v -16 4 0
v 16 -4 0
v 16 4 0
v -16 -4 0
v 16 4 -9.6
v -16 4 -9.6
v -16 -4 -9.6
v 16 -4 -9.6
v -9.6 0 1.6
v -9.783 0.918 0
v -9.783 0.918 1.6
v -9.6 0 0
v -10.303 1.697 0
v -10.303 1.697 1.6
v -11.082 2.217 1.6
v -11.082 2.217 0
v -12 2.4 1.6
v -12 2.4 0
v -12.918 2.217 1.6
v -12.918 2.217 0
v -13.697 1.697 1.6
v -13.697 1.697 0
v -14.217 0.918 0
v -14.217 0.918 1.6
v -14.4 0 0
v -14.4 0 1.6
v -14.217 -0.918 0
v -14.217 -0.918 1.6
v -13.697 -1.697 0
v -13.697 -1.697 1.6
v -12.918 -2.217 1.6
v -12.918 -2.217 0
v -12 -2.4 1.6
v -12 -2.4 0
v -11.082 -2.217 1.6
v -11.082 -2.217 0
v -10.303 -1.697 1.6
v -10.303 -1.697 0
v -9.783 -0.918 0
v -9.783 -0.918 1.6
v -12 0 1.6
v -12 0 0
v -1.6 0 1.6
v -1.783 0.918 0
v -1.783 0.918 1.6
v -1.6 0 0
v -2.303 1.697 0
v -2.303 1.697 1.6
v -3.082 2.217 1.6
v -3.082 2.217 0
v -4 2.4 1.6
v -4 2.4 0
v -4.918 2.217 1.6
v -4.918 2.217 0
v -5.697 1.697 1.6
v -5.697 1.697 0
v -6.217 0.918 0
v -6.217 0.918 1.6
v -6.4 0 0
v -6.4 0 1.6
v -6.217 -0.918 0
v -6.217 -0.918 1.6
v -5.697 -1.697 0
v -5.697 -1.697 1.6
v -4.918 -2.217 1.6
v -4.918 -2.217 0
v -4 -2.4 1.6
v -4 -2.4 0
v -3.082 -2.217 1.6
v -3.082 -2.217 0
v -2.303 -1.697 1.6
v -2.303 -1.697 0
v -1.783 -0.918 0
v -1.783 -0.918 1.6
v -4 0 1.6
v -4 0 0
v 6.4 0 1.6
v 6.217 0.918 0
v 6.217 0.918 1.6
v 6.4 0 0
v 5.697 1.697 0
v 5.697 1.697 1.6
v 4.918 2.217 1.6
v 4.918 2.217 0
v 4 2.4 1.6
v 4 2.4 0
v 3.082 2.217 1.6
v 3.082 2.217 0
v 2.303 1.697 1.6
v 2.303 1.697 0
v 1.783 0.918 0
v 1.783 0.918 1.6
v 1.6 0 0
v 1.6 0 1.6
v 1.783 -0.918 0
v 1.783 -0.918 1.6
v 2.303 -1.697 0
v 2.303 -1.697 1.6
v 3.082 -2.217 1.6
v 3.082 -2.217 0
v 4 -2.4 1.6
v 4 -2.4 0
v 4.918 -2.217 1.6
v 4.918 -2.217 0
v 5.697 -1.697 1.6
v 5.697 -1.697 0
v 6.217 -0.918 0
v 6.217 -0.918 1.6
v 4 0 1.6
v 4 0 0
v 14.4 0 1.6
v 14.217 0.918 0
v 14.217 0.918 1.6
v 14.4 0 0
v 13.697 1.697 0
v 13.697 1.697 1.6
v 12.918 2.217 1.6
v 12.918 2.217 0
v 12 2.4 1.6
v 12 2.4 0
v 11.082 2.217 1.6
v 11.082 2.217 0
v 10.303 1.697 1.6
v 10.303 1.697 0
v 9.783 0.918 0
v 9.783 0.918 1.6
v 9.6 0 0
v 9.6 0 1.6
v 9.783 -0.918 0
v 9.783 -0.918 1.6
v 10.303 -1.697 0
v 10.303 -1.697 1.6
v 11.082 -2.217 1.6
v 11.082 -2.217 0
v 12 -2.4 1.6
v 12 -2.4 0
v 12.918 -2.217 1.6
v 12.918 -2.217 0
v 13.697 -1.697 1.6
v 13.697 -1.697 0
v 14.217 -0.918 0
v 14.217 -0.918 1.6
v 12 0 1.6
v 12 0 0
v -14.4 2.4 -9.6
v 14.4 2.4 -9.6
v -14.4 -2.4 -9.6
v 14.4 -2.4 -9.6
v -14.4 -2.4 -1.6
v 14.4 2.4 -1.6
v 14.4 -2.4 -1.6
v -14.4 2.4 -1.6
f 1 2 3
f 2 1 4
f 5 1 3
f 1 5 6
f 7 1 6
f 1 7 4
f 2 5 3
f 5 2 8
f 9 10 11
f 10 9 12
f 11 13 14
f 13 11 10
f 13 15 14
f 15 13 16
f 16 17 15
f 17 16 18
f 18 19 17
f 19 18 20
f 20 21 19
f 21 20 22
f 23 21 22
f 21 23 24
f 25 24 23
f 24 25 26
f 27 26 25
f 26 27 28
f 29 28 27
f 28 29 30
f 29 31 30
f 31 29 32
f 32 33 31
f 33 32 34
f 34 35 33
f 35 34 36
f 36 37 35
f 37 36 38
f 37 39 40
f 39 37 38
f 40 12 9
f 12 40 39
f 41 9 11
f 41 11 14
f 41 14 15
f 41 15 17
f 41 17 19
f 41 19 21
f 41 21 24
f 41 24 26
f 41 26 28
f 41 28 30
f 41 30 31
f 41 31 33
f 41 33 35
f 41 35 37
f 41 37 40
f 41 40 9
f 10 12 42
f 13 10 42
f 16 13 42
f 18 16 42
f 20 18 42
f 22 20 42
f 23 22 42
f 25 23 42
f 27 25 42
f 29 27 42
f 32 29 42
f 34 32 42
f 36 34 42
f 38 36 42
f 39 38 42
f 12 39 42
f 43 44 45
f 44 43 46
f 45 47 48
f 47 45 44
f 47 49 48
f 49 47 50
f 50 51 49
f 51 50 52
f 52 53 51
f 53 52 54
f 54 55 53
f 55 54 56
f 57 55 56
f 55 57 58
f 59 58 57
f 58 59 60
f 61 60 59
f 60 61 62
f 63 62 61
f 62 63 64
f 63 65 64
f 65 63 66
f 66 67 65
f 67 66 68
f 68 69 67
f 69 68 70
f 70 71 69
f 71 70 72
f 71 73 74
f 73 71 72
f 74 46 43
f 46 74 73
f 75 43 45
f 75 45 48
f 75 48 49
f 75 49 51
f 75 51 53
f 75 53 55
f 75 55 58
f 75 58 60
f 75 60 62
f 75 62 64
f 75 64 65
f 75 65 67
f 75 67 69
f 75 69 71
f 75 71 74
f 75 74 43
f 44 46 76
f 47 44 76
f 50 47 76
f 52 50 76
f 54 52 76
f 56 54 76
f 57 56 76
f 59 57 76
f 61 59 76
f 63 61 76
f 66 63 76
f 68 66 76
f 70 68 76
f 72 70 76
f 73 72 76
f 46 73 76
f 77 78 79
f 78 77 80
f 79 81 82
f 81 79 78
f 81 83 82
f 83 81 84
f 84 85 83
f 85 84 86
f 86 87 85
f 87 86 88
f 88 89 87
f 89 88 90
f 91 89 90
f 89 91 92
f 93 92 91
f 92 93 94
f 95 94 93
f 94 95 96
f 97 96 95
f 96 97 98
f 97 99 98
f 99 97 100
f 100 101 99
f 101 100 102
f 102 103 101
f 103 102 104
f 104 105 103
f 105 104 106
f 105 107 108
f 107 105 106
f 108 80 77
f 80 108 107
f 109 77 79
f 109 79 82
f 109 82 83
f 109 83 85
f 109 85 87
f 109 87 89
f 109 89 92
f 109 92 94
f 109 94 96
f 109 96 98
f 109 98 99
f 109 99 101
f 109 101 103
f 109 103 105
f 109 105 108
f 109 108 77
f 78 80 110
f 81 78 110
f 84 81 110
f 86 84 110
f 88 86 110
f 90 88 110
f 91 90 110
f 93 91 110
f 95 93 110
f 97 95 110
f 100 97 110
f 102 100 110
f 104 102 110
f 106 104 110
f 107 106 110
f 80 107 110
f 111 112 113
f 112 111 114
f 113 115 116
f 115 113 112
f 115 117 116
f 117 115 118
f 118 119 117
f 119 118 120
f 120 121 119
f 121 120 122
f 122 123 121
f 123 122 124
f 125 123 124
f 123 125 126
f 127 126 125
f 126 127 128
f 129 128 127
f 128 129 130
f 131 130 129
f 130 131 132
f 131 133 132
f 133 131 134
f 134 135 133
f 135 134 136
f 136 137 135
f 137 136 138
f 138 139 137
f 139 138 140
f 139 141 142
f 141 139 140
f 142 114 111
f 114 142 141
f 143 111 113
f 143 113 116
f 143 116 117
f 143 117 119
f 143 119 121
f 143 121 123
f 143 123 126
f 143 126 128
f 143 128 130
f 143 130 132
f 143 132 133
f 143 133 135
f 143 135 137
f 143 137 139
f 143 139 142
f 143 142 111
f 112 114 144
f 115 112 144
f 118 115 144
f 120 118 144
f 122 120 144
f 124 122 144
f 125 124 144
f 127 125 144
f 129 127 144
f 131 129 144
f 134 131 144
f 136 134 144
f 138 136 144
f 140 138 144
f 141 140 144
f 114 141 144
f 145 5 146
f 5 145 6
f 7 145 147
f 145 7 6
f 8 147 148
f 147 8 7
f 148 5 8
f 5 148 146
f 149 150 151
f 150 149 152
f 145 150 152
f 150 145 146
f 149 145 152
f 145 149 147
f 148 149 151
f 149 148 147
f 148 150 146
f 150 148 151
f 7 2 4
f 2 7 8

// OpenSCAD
// file: ../p/4-4edge.scad
use <../lib.scad>
function ldraw_lib__4_4edge() = [
// 0 Circle 1.0
// 0 Name: 4-4edge.dat
// 0 Author: James Jessiman
// 0 !LDRAW_ORG Primitive UPDATE 2017-01
// 0 !LICENSE Licensed under CC BY 2.0 and CC BY 4.0 : see CAreadme.txt
// 
// 0 BFC CERTIFY CCW
  [0,"BFC","CERTIFY"],
  [0,"BFC","CCW"],
// 
// 0 !HISTORY 1998-12-15 [PTadmin] Official Update 1998-10
// 0 !HISTORY 2005-12-28 [PTadmin] Official Update 2005-01
// 0 !HISTORY 2007-06-24 [PTadmin] Header formatted for Contributor Agreement
// 0 !HISTORY 2008-07-01 [PTadmin] Official Update 2008-01
// 0 !HISTORY 2017-01-15 [Steffen] BFCed
// 0 !HISTORY 2017-12-30 [PTadmin] Official Update 2017-01
// 
// 
// 2 24 1 0 0 0.9239 0 0.3827
  [2,24,1,0,0,0.9239,0,0.3827],
// 2 24 0.9239 0 0.3827 0.7071 0 0.7071
  [2,24,0.9239,0,0.3827,0.7071,0,0.7071],
// 2 24 0.7071 0 0.7071 0.3827 0 0.9239
  [2,24,0.7071,0,0.7071,0.3827,0,0.9239],
// 2 24 0.3827 0 0.9239 0 0 1
  [2,24,0.3827,0,0.9239,0,0,1],
// 2 24 0 0 1 -0.3827 0 0.9239
  [2,24,0,0,1,-0.3827,0,0.9239],
// 2 24 -0.3827 0 0.9239 -0.7071 0 0.7071
  [2,24,-0.3827,0,0.9239,-0.7071,0,0.7071],
// 2 24 -0.7071 0 0.7071 -0.9239 0 0.3827
  [2,24,-0.7071,0,0.7071,-0.9239,0,0.3827],
// 2 24 -0.9239 0 0.3827 -1 0 -0
  [2,24,-0.9239,0,0.3827,-1,0,-0],
// 2 24 -1 0 -0 -0.9239 0 -0.3827
  [2,24,-1,0,-0,-0.9239,0,-0.3827],
// 2 24 -0.9239 0 -0.3827 -0.7071 0 -0.7071
  [2,24,-0.9239,0,-0.3827,-0.7071,0,-0.7071],
// 2 24 -0.7071 0 -0.7071 -0.3827 0 -0.9239
  [2,24,-0.7071,0,-0.7071,-0.3827,0,-0.9239],
// 2 24 -0.3827 0 -0.9239 0 0 -1
  [2,24,-0.3827,0,-0.9239,0,0,-1],
// 2 24 0 0 -1 0.3827 0 -0.9239
  [2,24,0,0,-1,0.3827,0,-0.9239],
// 2 24 0.3827 0 -0.9239 0.7071 0 -0.7071
  [2,24,0.3827,0,-0.9239,0.7071,0,-0.7071],
// 2 24 0.7071 0 -0.7071 0.9239 0 -0.3827
  [2,24,0.7071,0,-0.7071,0.9239,0,-0.3827],
// 2 24 0.9239 0 -0.3827 1 0 0
  [2,24,0.9239,0,-0.3827,1,0,0],
];
module ldraw_lib__4_4edge(step=0, col=false, unit=2/5, alt=false, line=0.2, solid=!$preview)
    makepoly(ldraw_lib__4_4edge(), step=step, col=col, unit=unit, alt=alt, line=line, solid=solid);
ldraw_lib__4_4edge(line=0.2);
// file: ../p/4-4disc.scad
use <../lib.scad>
function ldraw_lib__4_4disc() = [
// 0 Disc 1.0
// 0 Name: 4-4disc.dat
// 0 Author: James Jessiman
// 0 !LDRAW_ORG Primitive UPDATE 2002-02
// 0 !LICENSE Licensed under CC BY 2.0 and CC BY 4.0 : see CAreadme.txt
// 
// 0 BFC CERTIFY CCW
  [0,"BFC","CERTIFY"],
  [0,"BFC","CCW"],
// 
// 0 !HISTORY 1998-12-15 [PTadmin] Official Update 1998-10
// 0 !HISTORY 2002-03-23 [sbliss] Added BFC statement
// 0 !HISTORY 2002-04-25 [PTadmin] Official Update 2002-02
// 0 !HISTORY 2007-06-24 [PTadmin] Header formatted for Contributor Agreement
// 0 !HISTORY 2008-07-01 [PTadmin] Official Update 2008-01
// 
// 
// 3 16 0 0 0 1 0 0 0.9239 0 0.3827
  [3,16,0,0,0,1,0,0,0.9239,0,0.3827],
// 3 16 0 0 0 0.9239 0 0.3827 0.7071 0 0.7071
  [3,16,0,0,0,0.9239,0,0.3827,0.7071,0,0.7071],
// 3 16 0 0 0 0.7071 0 0.7071 0.3827 0 0.9239
  [3,16,0,0,0,0.7071,0,0.7071,0.3827,0,0.9239],
// 3 16 0 0 0 0.3827 0 0.9239 0 0 1
  [3,16,0,0,0,0.3827,0,0.9239,0,0,1],
// 3 16 0 0 0 0 0 1 -0.3827 0 0.9239
  [3,16,0,0,0,0,0,1,-0.3827,0,0.9239],
// 3 16 0 0 0 -0.3827 0 0.9239 -0.7071 0 0.7071
  [3,16,0,0,0,-0.3827,0,0.9239,-0.7071,0,0.7071],
// 3 16 0 0 0 -0.7071 0 0.7071 -0.9239 0 0.3827
  [3,16,0,0,0,-0.7071,0,0.7071,-0.9239,0,0.3827],
// 3 16 0 0 0 -0.9239 0 0.3827 -1 0 -0
  [3,16,0,0,0,-0.9239,0,0.3827,-1,0,-0],
// 3 16 0 0 0 -1 0 -0 -0.9239 0 -0.3827
  [3,16,0,0,0,-1,0,-0,-0.9239,0,-0.3827],
// 3 16 0 0 0 -0.9239 0 -0.3827 -0.7071 0 -0.7071
  [3,16,0,0,0,-0.9239,0,-0.3827,-0.7071,0,-0.7071],
// 3 16 0 0 0 -0.7071 0 -0.7071 -0.3827 0 -0.9239
  [3,16,0,0,0,-0.7071,0,-0.7071,-0.3827,0,-0.9239],
// 3 16 0 0 0 -0.3827 0 -0.9239 0 0 -1
  [3,16,0,0,0,-0.3827,0,-0.9239,0,0,-1],
// 3 16 0 0 0 0 0 -1 0.3827 0 -0.9239
  [3,16,0,0,0,0,0,-1,0.3827,0,-0.9239],
// 3 16 0 0 0 0.3827 0 -0.9239 0.7071 0 -0.7071
  [3,16,0,0,0,0.3827,0,-0.9239,0.7071,0,-0.7071],
// 3 16 0 0 0 0.7071 0 -0.7071 0.9239 0 -0.3827
  [3,16,0,0,0,0.7071,0,-0.7071,0.9239,0,-0.3827],
// 3 16 0 0 0 0.9239 0 -0.3827 1 0 0
  [3,16,0,0,0,0.9239,0,-0.3827,1,0,0],
// 0
];
module ldraw_lib__4_4disc(step=0, col=false, unit=2/5, alt=false, line=0.2, solid=!$preview)
    makepoly(ldraw_lib__4_4disc(), step=step, col=col, unit=unit, alt=alt, line=line, solid=solid);
ldraw_lib__4_4disc(line=0.2);
// file: ../p/4-4cyli.scad
use <../lib.scad>
$fa=1; $fs=0.2;
function ldraw_lib__4_4cyli(realsolid=false) = [
// 0 Cylinder 1.0
// 0 Name: 4-4cyli.dat
// 0 Author: James Jessiman
// 0 !LDRAW_ORG Primitive UPDATE 2005-01
// 0 !LICENSE Licensed under CC BY 2.0 and CC BY 4.0 : see CAreadme.txt
// 
// 0 BFC CERTIFY CCW
  [0,"BFC","CERTIFY"],
  [0,"BFC","CCW"],
// 
// 0 !HISTORY 1998-12-15 [PTadmin] Official Update 1998-10
// 0 !HISTORY 2002-03-23 [sbliss] Added BFC statement; merged headers from files in distributions LDraw 0.27 and Complete.
// 0 !HISTORY 2002-04-25 [PTadmin] Official Update 2002-02
// 0 !HISTORY 2004-12-14 [guyvivan] BFC CCW
// 0 !HISTORY 2005-12-28 [PTadmin] Official Update 2005-01
// 0 !HISTORY 2007-06-24 [PTadmin] Header formatted for Contributor Agreement
// 0 !HISTORY 2008-07-01 [PTadmin] Official Update 2008-01
// 
// 
// 4 16 1 1 0 0.9239 1 0.3827 0.9239 0 0.3827 1 0 0
  [4,16,1,1,0,0.9239,1,0.3827,0.9239,0,0.3827,1,0,0],
// 5 24 1 0 0 1 1 0 0.9239 0 0.3827 0.9239 0 -0.3827
  [5,24,1,0,0,1,1,0,0.9239,0,0.3827,0.9239,0,-0.3827],
// 4 16 0.9239 1 0.3827 0.7071 1 0.7071 0.7071 0 0.7071 0.9239 0 0.3827
  [4,16,0.9239,1,0.3827,0.7071,1,0.7071,0.7071,0,0.7071,0.9239,0,0.3827],
// 5 24 0.9239 0 0.3827 0.9239 1 0.3827 0.7071 0 0.7071 1 0 0
  [5,24,0.9239,0,0.3827,0.9239,1,0.3827,0.7071,0,0.7071,1,0,0],
// 4 16 0.7071 1 0.7071 0.3827 1 0.9239 0.3827 0 0.9239 0.7071 0 0.7071
  [4,16,0.7071,1,0.7071,0.3827,1,0.9239,0.3827,0,0.9239,0.7071,0,0.7071],
// 5 24 0.7071 0 0.7071 0.7071 1 0.7071 0.3827 0 0.9239 0.9239 0 0.3827
  [5,24,0.7071,0,0.7071,0.7071,1,0.7071,0.3827,0,0.9239,0.9239,0,0.3827],
// 4 16 0.3827 1 0.9239 0 1 1 0 0 1 0.3827 0 0.9239
  [4,16,0.3827,1,0.9239,0,1,1,0,0,1,0.3827,0,0.9239],
// 5 24 0.3827 0 0.9239 0.3827 1 0.9239 0 0 1 0.7071 0 0.7071
  [5,24,0.3827,0,0.9239,0.3827,1,0.9239,0,0,1,0.7071,0,0.7071],
// 4 16 0 1 1 -0.3827 1 0.9239 -0.3827 0 0.9239 0 0 1
  [4,16,0,1,1,-0.3827,1,0.9239,-0.3827,0,0.9239,0,0,1],
// 5 24 0 0 1 0 1 1 -0.3827 0 0.9239 0.3827 0 0.9239
  [5,24,0,0,1,0,1,1,-0.3827,0,0.9239,0.3827,0,0.9239],
// 4 16 -0.3827 1 0.9239 -0.7071 1 0.7071 -0.7071 0 0.7071 -0.3827 0 0.9239
  [4,16,-0.3827,1,0.9239,-0.7071,1,0.7071,-0.7071,0,0.7071,-0.3827,0,0.9239],
// 5 24 -0.3827 0 0.9239 -0.3827 1 0.9239 -0.7071 0 0.7071 0 0 1
  [5,24,-0.3827,0,0.9239,-0.3827,1,0.9239,-0.7071,0,0.7071,0,0,1],
// 4 16 -0.7071 1 0.7071 -0.9239 1 0.3827 -0.9239 0 0.3827 -0.7071 0 0.7071
  [4,16,-0.7071,1,0.7071,-0.9239,1,0.3827,-0.9239,0,0.3827,-0.7071,0,0.7071],
// 5 24 -0.7071 0 0.7071 -0.7071 1 0.7071 -0.9239 0 0.3827 -0.3827 0 0.9239
  [5,24,-0.7071,0,0.7071,-0.7071,1,0.7071,-0.9239,0,0.3827,-0.3827,0,0.9239],
// 4 16 -0.9239 1 0.3827 -1 1 0 -1 0 0 -0.9239 0 0.3827
  [4,16,-0.9239,1,0.3827,-1,1,0,-1,0,0,-0.9239,0,0.3827],
// 5 24 -0.9239 0 0.3827 -0.9239 1 0.3827 -1 0 0 -0.7071 0 0.7071
  [5,24,-0.9239,0,0.3827,-0.9239,1,0.3827,-1,0,0,-0.7071,0,0.7071],
// 4 16 -1 1 0 -0.9239 1 -0.3827 -0.9239 0 -0.3827 -1 0 0
  [4,16,-1,1,0,-0.9239,1,-0.3827,-0.9239,0,-0.3827,-1,0,0],
// 5 24 -1 0 0 -1 1 0 -0.9239 0 -0.3827 -0.9239 0 0.3827
  [5,24,-1,0,0,-1,1,0,-0.9239,0,-0.3827,-0.9239,0,0.3827],
// 4 16 -0.9239 1 -0.3827 -0.7071 1 -0.7071 -0.7071 0 -0.7071 -0.9239 0 -0.3827
  [4,16,-0.9239,1,-0.3827,-0.7071,1,-0.7071,-0.7071,0,-0.7071,-0.9239,0,-0.3827],
// 5 24 -0.9239 0 -0.3827 -0.9239 1 -0.3827 -0.7071 0 -0.7071 -1 0 0
  [5,24,-0.9239,0,-0.3827,-0.9239,1,-0.3827,-0.7071,0,-0.7071,-1,0,0],
// 4 16 -0.7071 1 -0.7071 -0.3827 1 -0.9239 -0.3827 0 -0.9239 -0.7071 0 -0.7071
  [4,16,-0.7071,1,-0.7071,-0.3827,1,-0.9239,-0.3827,0,-0.9239,-0.7071,0,-0.7071],
// 5 24 -0.7071 0 -0.7071 -0.7071 1 -0.7071 -0.3827 0 -0.9239 -0.9239 0 -0.3827
  [5,24,-0.7071,0,-0.7071,-0.7071,1,-0.7071,-0.3827,0,-0.9239,-0.9239,0,-0.3827],
// 4 16 -0.3827 1 -0.9239 0 1 -1 0 0 -1 -0.3827 0 -0.9239
  [4,16,-0.3827,1,-0.9239,0,1,-1,0,0,-1,-0.3827,0,-0.9239],
// 5 24 -0.3827 0 -0.9239 -0.3827 1 -0.9239 0 0 -1 -0.7071 0 -0.7071
  [5,24,-0.3827,0,-0.9239,-0.3827,1,-0.9239,0,0,-1,-0.7071,0,-0.7071],
// 4 16 0 1 -1 0.3827 1 -0.9239 0.3827 0 -0.9239 0 0 -1
  [4,16,0,1,-1,0.3827,1,-0.9239,0.3827,0,-0.9239,0,0,-1],
// 5 24 0 0 -1 0 1 -1 0.3827 0 -0.9239 -0.3827 0 -0.9239
  [5,24,0,0,-1,0,1,-1,0.3827,0,-0.9239,-0.3827,0,-0.9239],
// 4 16 0.3827 1 -0.9239 0.7071 1 -0.7071 0.7071 0 -0.7071 0.3827 0 -0.9239
  [4,16,0.3827,1,-0.9239,0.7071,1,-0.7071,0.7071,0,-0.7071,0.3827,0,-0.9239],
// 5 24 0.3827 0 -0.9239 0.3827 1 -0.9239 0.7071 0 -0.7071 0 0 -1
  [5,24,0.3827,0,-0.9239,0.3827,1,-0.9239,0.7071,0,-0.7071,0,0,-1],
// 4 16 0.7071 1 -0.7071 0.9239 1 -0.3827 0.9239 0 -0.3827 0.7071 0 -0.7071
  [4,16,0.7071,1,-0.7071,0.9239,1,-0.3827,0.9239,0,-0.3827,0.7071,0,-0.7071],
// 5 24 0.7071 0 -0.7071 0.7071 1 -0.7071 0.9239 0 -0.3827 0.3827 0 -0.9239
  [5,24,0.7071,0,-0.7071,0.7071,1,-0.7071,0.9239,0,-0.3827,0.3827,0,-0.9239],
// 4 16 0.9239 1 -0.3827 1 1 0 1 0 0 0.9239 0 -0.3827
  [4,16,0.9239,1,-0.3827,1,1,0,1,0,0,0.9239,0,-0.3827],
// 5 24 0.9239 0 -0.3827 0.9239 1 -0.3827 1 0 0 0.7071 0 -0.7071
  [5,24,0.9239,0,-0.3827,0.9239,1,-0.3827,1,0,0,0.7071,0,-0.7071],
// 0
];
module ldraw_lib__4_4cyli(step=0, col=false, unit=2/5, alt=false, line=0.2, solid=!$preview)
    makepoly(ldraw_lib__4_4cyli(solid), step=step, col=col, unit=unit, alt=alt, line=line, solid=solid);
ldraw_lib__4_4cyli(line=0.2);
// file: ../p/stud.scad
use <../lib.scad>
use <4-4cyli.scad>
use <4-4disc.scad>
use <4-4edge.scad>
function ldraw_lib__stud() = [
// 0 Stud
// 0 Name: stud.dat
// 0 Author: James Jessiman
// 0 !LDRAW_ORG Primitive UPDATE 2012-01
// 0 !LICENSE Licensed under CC BY 4.0 : see CAreadme.txt
// 
// 0 BFC CERTIFY CCW
  [0,"BFC","CERTIFY"],
  [0,"BFC","CCW"],
// 
// 0 !HISTORY 2002-04-04 [sbliss] Modified for BFC compliance
// 0 !HISTORY 2002-04-25 [PTadmin] Official Update 2002-02
// 0 !HISTORY 2007-06-24 [PTadmin] Header formatted for Contributor Agreement
// 0 !HISTORY 2008-07-01 [PTadmin] Official Update 2008-01
// 0 !HISTORY 2012-02-16 [Philo] Changed to CCW
// 0 !HISTORY 2012-03-30 [PTadmin] Official Update 2012-01
// 
// 
// 1 16 0 0 0 6 0 0 0 1 0 0 0 6 4-4edge.dat
  [1,16,0,0,0,6,0,0,0,1,0,0,0,6, ldraw_lib__4_4edge()],
// 1 16 0 -4 0 6 0 0 0 1 0 0 0 6 4-4edge.dat
  [1,16,0,-4,0,6,0,0,0,1,0,0,0,6, ldraw_lib__4_4edge()],
// 1 16 0 0 0 6 0 0 0 -4 0 0 0 6 4-4cyli.dat
  [1,16,0,0,0,6,0,0,0,-4,0,0,0,6, ldraw_lib__4_4cyli()],
// 1 16 0 -4 0 6 0 0 0 1 0 0 0 6 4-4disc.dat
  [1,16,0,-4,0,6,0,0,0,1,0,0,0,6, ldraw_lib__4_4disc()],
  [-1,16,0,0,0,6,0,0,0,-1,0,0,0,6, ldraw_lib__4_4disc()],
];
module ldraw_lib__stud(step=0, col=false, unit=2/5, alt=false, line=0.2, solid=!$preview)
    makepoly(ldraw_lib__stud(), step=step, col=col, unit=unit, alt=alt, line=line, solid=solid);
ldraw_lib__stud(line=0.2);
// file: ../p/stug-1x4.scad
use <../lib.scad>
use <stud.scad>
function ldraw_lib__stug_1x4() = [
// 0 Stud Group  1 x  4
// 0 Name: stug-1x4.dat
// 0 Author: Steffen [Steffen]
// 0 !LDRAW_ORG Primitive UPDATE 2011-01
// 0 !LICENSE Licensed under CC BY 4.0 : see CAreadme.txt
// 
// 0 BFC CERTIFY CCW
  [0,"BFC","CERTIFY"],
  [0,"BFC","CCW"],
// 
// 0 !HISTORY 2011-07-25 [PTadmin] Official Update 2011-01
// 
// 
// 1 16 -30 0 0 1 0 0 0 1 0 0 0 1 stud.dat
  [1,16,-30,0,0,1,0,0,0,1,0,0,0,1, ldraw_lib__stud()],
// 1 16 -10 0 0 1 0 0 0 1 0 0 0 1 stud.dat
  [1,16,-10,0,0,1,0,0,0,1,0,0,0,1, ldraw_lib__stud()],
// 1 16 10 0 0 1 0 0 0 1 0 0 0 1 stud.dat
  [1,16,10,0,0,1,0,0,0,1,0,0,0,1, ldraw_lib__stud()],
// 1 16 30 0 0 1 0 0 0 1 0 0 0 1 stud.dat
  [1,16,30,0,0,1,0,0,0,1,0,0,0,1, ldraw_lib__stud()],
];
module ldraw_lib__stug_1x4(step=0, col=false, unit=2/5, alt=false, line=0.2, solid=!$preview)
    makepoly(ldraw_lib__stug_1x4(), step=step, col=col, unit=unit, alt=alt, line=line, solid=solid);
ldraw_lib__stug_1x4(line=0.2);
// file: ../p/box5.scad
use <../lib.scad>
function ldraw_lib__box5() = [
// 0 Box with 5 Faces and All Edges
// 0 Name: box5.dat
// 0 Author: James Jessiman
// 0 !LDRAW_ORG Primitive UPDATE 2012-01
// 0 !LICENSE Licensed under CC BY 2.0 and CC BY 4.0 : see CAreadme.txt
// 
// 0 BFC CERTIFY CCW
  [0,"BFC","CERTIFY"],
  [0,"BFC","CCW"],
// 
// 0 !HISTORY 2002-04-03 [sbliss] Modified for BFC compliance
// 0 !HISTORY 2002-04-25 [PTadmin] Official Update 2002-02
// 0 !HISTORY 2007-06-24 [PTadmin] Header formatted for Contributor Agreement
// 0 !HISTORY 2008-07-01 [PTadmin] Official Update 2008-01
// 0 !HISTORY 2012-02-16 [Philo] Changed to CCW
// 0 !HISTORY 2012-03-30 [PTadmin] Official Update 2012-01
// 
// 
// 2 24 1 1 1 -1 1 1
  [2,24,1,1,1,-1,1,1],
// 2 24 -1 1 1 -1 1 -1
  [2,24,-1,1,1,-1,1,-1],
// 2 24 -1 1 -1 1 1 -1
  [2,24,-1,1,-1,1,1,-1],
// 2 24 1 1 -1 1 1 1
  [2,24,1,1,-1,1,1,1],
// 2 24 1 0 1 -1 0 1
  [2,24,1,0,1,-1,0,1],
// 2 24 -1 0 1 -1 0 -1
  [2,24,-1,0,1,-1,0,-1],
// 2 24 -1 0 -1 1 0 -1
  [2,24,-1,0,-1,1,0,-1],
// 2 24 1 0 -1 1 0 1
  [2,24,1,0,-1,1,0,1],
// 2 24 1 0 1 1 1 1
  [2,24,1,0,1,1,1,1],
// 2 24 -1 0 1 -1 1 1
  [2,24,-1,0,1,-1,1,1],
// 2 24 1 0 -1 1 1 -1
  [2,24,1,0,-1,1,1,-1],
// 2 24 -1 0 -1 -1 1 -1
  [2,24,-1,0,-1,-1,1,-1],
// 4 16 -1 1 1 1 1 1 1 1 -1 -1 1 -1
  [4,16,-1,1,1,1,1,1,1,1,-1,-1,1,-1],
// 4 16 -1 1 1 -1 0 1 1 0 1 1 1 1
  [4,16,-1,1,1,-1,0,1,1,0,1,1,1,1],
// 4 16 -1 1 -1 -1 0 -1 -1 0 1 -1 1 1
  [4,16,-1,1,-1,-1,0,-1,-1,0,1,-1,1,1],
// 4 16 1 1 -1 1 0 -1 -1 0 -1 -1 1 -1
  [4,16,1,1,-1,1,0,-1,-1,0,-1,-1,1,-1],
// 4 16 1 1 1 1 0 1 1 0 -1 1 1 -1
  [4,16,1,1,1,1,0,1,1,0,-1,1,1,-1],
];
makepoly(ldraw_lib__box5(), line=0.2);
// file: ../p/box4t.scad
use <../lib.scad>
function ldraw_lib__box4t() = [
// 0 Box with 4 Adjacent Faces and All Edges
// 0 Name: box4t.dat
// 0 Author: Tore Eriksson [Tore_Eriksson]
// 0 !LDRAW_ORG Primitive UPDATE 2003-02
// 0 !LICENSE Licensed under CC BY 2.0 and CC BY 4.0 : see CAreadme.txt
// 
// 0 BFC CERTIFY CCW
  [0,"BFC","CERTIFY"],
  [0,"BFC","CCW"],
// 
// 0 !HISTORY 1997-09-29 [PTadmin] Official Update 1997-15
// 0 !HISTORY 2002-08-31 [izanette] Modified with WINDZ for BFC compliance
// 0 !HISTORY 2003-08-01 [PTadmin] Official Update 2003-02
// 0 !HISTORY 2007-06-24 [PTadmin] Header formatted for Contributor Agreement
// 0 !HISTORY 2008-07-01 [PTadmin] Official Update 2008-01
// 
// 
// 2 24 1 1 1 -1 1 1
  [2,24,1,1,1,-1,1,1],
// 2 24 -1 1 1 -1 1 -1
  [2,24,-1,1,1,-1,1,-1],
// 2 24 -1 1 -1 1 1 -1
  [2,24,-1,1,-1,1,1,-1],
// 2 24 1 1 -1 1 1 1
  [2,24,1,1,-1,1,1,1],
// 2 24 1 0 1 -1 0 1
  [2,24,1,0,1,-1,0,1],
// 2 24 -1 0 1 -1 0 -1
  [2,24,-1,0,1,-1,0,-1],
// 2 24 -1 0 -1 1 0 -1
  [2,24,-1,0,-1,1,0,-1],
// 2 24 1 0 -1 1 0 1
  [2,24,1,0,-1,1,0,1],
// 2 24 1 0 1 1 1 1
  [2,24,1,0,1,1,1,1],
// 2 24 -1 0 1 -1 1 1
  [2,24,-1,0,1,-1,1,1],
// 2 24 1 0 -1 1 1 -1
  [2,24,1,0,-1,1,1,-1],
// 2 24 -1 0 -1 -1 1 -1
  [2,24,-1,0,-1,-1,1,-1],
// 4 16 1 1 1 1 1 -1 -1 1 -1 -1 1 1
  [4,16,1,1,1,1,1,-1,-1,1,-1,-1,1,1],
// 4 16 1 1 1 -1 1 1 -1 0 1 1 0 1
  [4,16,1,1,1,-1,1,1,-1,0,1,1,0,1],
// 4 16 -1 1 1 -1 1 -1 -1 0 -1 -1 0 1
  [4,16,-1,1,1,-1,1,-1,-1,0,-1,-1,0,1],
// 0 4 16 -1 1 -1 -1 0 -1 1 0 -1 1 1 -1
// 4 16 1 1 -1 1 1 1 1 0 1 1 0 -1
  [4,16,1,1,-1,1,1,1,1,0,1,1,0,-1],
// 0
];
makepoly(ldraw_lib__box4t(), line=0.2);
// file: s/3066s01.scad
use <../../lib.scad>
use <../../p/box4t.scad>
use <../../p/box5.scad>
use <../../p/stug-1x4.scad>
function ldraw_lib__s__3066s01() = [
// 0 ~Brick  1 x  4 without Centre Studs without Front Face
// 0 Name: s\3066s01.dat
// 0 Author: Michael Heidemann [mikeheide]
// 0 !LDRAW_ORG Subpart UPDATE 2013-01
// 0 !LICENSE Licensed under CC BY 2.0 and CC BY 4.0 : see CAreadme.txt
// 
// 0 BFC CERTIFY CCW
  [0,"BFC","CERTIFY"],
  [0,"BFC","CCW"],
// 
// 0 !HISTORY 2013-07-21 [PTadmin] Official Update 2013-01
// 
// 
// 1 16 0 24 0 40 0 0 0 -24 0 0 0 10 box4t.dat
  [1,16,0,24,0,40,0,0,0,-24,0,0,0,10, ldraw_lib__box4t()],
// 1 16 0 0 0 1 0 0 0 1 0 0 0 1 stug-1x4.dat
  [1,16,0,0,0,1,0,0,0,1,0,0,0,1, ldraw_lib__stug_1x4()],
// 4 16 40 24 10 36 24 6 -36 24 6 -40 24 10
  [4,16,40,24,10,36,24,6,-36,24,6,-40,24,10],
// 4 16 -40 24 10 -36 24 6 -36 24 -6 -40 24 -10
  [4,16,-40,24,10,-36,24,6,-36,24,-6,-40,24,-10],
// 4 16 -40 24 -10 -36 24 -6 36 24 -6 40 24 -10
  [4,16,-40,24,-10,-36,24,-6,36,24,-6,40,24,-10],
// 4 16 40 24 -10 36 24 -6 36 24 6 40 24 10
  [4,16,40,24,-10,36,24,-6,36,24,6,40,24,10],
// 0 BFC INVERTNEXT
  [0,"BFC","INVERTNEXT"],
// 1 16 0 24 0 36 0 0 0 -20 0 0 0 6 box5.dat
  [1,16,0,24,0,36,0,0,0,-20,0,0,0,6, ldraw_lib__box5()],
];
module ldraw_lib__s__3066s01(step=0, col=false, unit=2/5, alt=false, line=0.2, solid=!$preview)
    makepoly(ldraw_lib__s__3066s01(), step=step, col=col, unit=unit, alt=alt, line=line, solid=solid);
ldraw_lib__s__3066s01(line=0.2);
// file: 3066.scad
use <../lib.scad>
use <s/3066s01.scad>
$fa=1; $fs=0.2;
function ldraw_lib__3066(realsolid=false) = [
// 0 Brick  1 x  4 without Centre Studs
// 0 Name: 3066.dat
// 0 Author: James Jessiman
// 0 !LDRAW_ORG Part UPDATE 2013-01
// 0 !LICENSE Licensed under CC BY 2.0 and CC BY 4.0 : see CAreadme.txt
// 
// 0 BFC CERTIFY CCW
  [0,"BFC","CERTIFY"],
  [0,"BFC","CCW"],
// 
// 0 !HISTORY 2007-06-10 [PTadmin] Header formatted for Contributor Agreement
// 0 !HISTORY 2008-07-01 [PTadmin] Official Update 2008-01
// 0 !HISTORY 2013-01-27 [Steffen] BFCed
// 0 !HISTORY 2013-07-21 [PTadmin] Official Update 2013-01
// 
// 
// 1 16 0 0 0 1 0 0 0 1 0 0 0 1 s\3066s01.dat
  [1,16,0,0,0,1,0,0,0,1,0,0,0,1, ldraw_lib__s__3066s01(realsolid)],
// 4 16 -40 0 -10 -40 24 -10 40 24 -10 40 0 -10
  [4,16,-40,0,-10,-40,24,-10,40,24,-10,40,0,-10],
];
module ldraw_lib__3066(step=0, col=false, unit=2/5, alt=false, line=0.2, solid=!$preview)
    makepoly(ldraw_lib__3066(solid), step=step, col=col, unit=unit, alt=alt, line=line, solid=solid);
ldraw_lib__3066(line=0.2);
// main file
use <../lib.scad>
use <3066.scad>
function ldraw_lib__35256() = [
// 0 =Brick  1 x  4 without Centre Studs
// 0 Name: 35256.dat
// 0 Author: Massimo Maso [Sirio]
// 0 !LDRAW_ORG Part Alias UPDATE 2025-06
// 0 !LICENSE Licensed under CC BY 4.0 : see CAreadme.txt
// 
// 0 BFC CERTIFY CCW
  [0,"BFC","CERTIFY"],
  [0,"BFC","CCW"],
// 
// 0 !KEYWORDS BrickLink 3066, Rebrickable 3066
// 
// 0 !HISTORY 2025-06-26 [OrionP] Official Update 2025-06
// 
// 1 16 0 0 0 1 0 0 0 1 0 0 0 1 3066.dat
  [1,16,0,0,0,1,0,0,0,1,0,0,0,1, ldraw_lib__3066()],
];
module ldraw_lib__35256(step=0, col=false, unit=2/5, alt=false, line=0.2, solid=!$preview)
    makepoly(ldraw_lib__35256(), step=step, col=col, unit=unit, alt=alt, line=line, solid=solid);
ldraw_lib__35256(line=0.2);
